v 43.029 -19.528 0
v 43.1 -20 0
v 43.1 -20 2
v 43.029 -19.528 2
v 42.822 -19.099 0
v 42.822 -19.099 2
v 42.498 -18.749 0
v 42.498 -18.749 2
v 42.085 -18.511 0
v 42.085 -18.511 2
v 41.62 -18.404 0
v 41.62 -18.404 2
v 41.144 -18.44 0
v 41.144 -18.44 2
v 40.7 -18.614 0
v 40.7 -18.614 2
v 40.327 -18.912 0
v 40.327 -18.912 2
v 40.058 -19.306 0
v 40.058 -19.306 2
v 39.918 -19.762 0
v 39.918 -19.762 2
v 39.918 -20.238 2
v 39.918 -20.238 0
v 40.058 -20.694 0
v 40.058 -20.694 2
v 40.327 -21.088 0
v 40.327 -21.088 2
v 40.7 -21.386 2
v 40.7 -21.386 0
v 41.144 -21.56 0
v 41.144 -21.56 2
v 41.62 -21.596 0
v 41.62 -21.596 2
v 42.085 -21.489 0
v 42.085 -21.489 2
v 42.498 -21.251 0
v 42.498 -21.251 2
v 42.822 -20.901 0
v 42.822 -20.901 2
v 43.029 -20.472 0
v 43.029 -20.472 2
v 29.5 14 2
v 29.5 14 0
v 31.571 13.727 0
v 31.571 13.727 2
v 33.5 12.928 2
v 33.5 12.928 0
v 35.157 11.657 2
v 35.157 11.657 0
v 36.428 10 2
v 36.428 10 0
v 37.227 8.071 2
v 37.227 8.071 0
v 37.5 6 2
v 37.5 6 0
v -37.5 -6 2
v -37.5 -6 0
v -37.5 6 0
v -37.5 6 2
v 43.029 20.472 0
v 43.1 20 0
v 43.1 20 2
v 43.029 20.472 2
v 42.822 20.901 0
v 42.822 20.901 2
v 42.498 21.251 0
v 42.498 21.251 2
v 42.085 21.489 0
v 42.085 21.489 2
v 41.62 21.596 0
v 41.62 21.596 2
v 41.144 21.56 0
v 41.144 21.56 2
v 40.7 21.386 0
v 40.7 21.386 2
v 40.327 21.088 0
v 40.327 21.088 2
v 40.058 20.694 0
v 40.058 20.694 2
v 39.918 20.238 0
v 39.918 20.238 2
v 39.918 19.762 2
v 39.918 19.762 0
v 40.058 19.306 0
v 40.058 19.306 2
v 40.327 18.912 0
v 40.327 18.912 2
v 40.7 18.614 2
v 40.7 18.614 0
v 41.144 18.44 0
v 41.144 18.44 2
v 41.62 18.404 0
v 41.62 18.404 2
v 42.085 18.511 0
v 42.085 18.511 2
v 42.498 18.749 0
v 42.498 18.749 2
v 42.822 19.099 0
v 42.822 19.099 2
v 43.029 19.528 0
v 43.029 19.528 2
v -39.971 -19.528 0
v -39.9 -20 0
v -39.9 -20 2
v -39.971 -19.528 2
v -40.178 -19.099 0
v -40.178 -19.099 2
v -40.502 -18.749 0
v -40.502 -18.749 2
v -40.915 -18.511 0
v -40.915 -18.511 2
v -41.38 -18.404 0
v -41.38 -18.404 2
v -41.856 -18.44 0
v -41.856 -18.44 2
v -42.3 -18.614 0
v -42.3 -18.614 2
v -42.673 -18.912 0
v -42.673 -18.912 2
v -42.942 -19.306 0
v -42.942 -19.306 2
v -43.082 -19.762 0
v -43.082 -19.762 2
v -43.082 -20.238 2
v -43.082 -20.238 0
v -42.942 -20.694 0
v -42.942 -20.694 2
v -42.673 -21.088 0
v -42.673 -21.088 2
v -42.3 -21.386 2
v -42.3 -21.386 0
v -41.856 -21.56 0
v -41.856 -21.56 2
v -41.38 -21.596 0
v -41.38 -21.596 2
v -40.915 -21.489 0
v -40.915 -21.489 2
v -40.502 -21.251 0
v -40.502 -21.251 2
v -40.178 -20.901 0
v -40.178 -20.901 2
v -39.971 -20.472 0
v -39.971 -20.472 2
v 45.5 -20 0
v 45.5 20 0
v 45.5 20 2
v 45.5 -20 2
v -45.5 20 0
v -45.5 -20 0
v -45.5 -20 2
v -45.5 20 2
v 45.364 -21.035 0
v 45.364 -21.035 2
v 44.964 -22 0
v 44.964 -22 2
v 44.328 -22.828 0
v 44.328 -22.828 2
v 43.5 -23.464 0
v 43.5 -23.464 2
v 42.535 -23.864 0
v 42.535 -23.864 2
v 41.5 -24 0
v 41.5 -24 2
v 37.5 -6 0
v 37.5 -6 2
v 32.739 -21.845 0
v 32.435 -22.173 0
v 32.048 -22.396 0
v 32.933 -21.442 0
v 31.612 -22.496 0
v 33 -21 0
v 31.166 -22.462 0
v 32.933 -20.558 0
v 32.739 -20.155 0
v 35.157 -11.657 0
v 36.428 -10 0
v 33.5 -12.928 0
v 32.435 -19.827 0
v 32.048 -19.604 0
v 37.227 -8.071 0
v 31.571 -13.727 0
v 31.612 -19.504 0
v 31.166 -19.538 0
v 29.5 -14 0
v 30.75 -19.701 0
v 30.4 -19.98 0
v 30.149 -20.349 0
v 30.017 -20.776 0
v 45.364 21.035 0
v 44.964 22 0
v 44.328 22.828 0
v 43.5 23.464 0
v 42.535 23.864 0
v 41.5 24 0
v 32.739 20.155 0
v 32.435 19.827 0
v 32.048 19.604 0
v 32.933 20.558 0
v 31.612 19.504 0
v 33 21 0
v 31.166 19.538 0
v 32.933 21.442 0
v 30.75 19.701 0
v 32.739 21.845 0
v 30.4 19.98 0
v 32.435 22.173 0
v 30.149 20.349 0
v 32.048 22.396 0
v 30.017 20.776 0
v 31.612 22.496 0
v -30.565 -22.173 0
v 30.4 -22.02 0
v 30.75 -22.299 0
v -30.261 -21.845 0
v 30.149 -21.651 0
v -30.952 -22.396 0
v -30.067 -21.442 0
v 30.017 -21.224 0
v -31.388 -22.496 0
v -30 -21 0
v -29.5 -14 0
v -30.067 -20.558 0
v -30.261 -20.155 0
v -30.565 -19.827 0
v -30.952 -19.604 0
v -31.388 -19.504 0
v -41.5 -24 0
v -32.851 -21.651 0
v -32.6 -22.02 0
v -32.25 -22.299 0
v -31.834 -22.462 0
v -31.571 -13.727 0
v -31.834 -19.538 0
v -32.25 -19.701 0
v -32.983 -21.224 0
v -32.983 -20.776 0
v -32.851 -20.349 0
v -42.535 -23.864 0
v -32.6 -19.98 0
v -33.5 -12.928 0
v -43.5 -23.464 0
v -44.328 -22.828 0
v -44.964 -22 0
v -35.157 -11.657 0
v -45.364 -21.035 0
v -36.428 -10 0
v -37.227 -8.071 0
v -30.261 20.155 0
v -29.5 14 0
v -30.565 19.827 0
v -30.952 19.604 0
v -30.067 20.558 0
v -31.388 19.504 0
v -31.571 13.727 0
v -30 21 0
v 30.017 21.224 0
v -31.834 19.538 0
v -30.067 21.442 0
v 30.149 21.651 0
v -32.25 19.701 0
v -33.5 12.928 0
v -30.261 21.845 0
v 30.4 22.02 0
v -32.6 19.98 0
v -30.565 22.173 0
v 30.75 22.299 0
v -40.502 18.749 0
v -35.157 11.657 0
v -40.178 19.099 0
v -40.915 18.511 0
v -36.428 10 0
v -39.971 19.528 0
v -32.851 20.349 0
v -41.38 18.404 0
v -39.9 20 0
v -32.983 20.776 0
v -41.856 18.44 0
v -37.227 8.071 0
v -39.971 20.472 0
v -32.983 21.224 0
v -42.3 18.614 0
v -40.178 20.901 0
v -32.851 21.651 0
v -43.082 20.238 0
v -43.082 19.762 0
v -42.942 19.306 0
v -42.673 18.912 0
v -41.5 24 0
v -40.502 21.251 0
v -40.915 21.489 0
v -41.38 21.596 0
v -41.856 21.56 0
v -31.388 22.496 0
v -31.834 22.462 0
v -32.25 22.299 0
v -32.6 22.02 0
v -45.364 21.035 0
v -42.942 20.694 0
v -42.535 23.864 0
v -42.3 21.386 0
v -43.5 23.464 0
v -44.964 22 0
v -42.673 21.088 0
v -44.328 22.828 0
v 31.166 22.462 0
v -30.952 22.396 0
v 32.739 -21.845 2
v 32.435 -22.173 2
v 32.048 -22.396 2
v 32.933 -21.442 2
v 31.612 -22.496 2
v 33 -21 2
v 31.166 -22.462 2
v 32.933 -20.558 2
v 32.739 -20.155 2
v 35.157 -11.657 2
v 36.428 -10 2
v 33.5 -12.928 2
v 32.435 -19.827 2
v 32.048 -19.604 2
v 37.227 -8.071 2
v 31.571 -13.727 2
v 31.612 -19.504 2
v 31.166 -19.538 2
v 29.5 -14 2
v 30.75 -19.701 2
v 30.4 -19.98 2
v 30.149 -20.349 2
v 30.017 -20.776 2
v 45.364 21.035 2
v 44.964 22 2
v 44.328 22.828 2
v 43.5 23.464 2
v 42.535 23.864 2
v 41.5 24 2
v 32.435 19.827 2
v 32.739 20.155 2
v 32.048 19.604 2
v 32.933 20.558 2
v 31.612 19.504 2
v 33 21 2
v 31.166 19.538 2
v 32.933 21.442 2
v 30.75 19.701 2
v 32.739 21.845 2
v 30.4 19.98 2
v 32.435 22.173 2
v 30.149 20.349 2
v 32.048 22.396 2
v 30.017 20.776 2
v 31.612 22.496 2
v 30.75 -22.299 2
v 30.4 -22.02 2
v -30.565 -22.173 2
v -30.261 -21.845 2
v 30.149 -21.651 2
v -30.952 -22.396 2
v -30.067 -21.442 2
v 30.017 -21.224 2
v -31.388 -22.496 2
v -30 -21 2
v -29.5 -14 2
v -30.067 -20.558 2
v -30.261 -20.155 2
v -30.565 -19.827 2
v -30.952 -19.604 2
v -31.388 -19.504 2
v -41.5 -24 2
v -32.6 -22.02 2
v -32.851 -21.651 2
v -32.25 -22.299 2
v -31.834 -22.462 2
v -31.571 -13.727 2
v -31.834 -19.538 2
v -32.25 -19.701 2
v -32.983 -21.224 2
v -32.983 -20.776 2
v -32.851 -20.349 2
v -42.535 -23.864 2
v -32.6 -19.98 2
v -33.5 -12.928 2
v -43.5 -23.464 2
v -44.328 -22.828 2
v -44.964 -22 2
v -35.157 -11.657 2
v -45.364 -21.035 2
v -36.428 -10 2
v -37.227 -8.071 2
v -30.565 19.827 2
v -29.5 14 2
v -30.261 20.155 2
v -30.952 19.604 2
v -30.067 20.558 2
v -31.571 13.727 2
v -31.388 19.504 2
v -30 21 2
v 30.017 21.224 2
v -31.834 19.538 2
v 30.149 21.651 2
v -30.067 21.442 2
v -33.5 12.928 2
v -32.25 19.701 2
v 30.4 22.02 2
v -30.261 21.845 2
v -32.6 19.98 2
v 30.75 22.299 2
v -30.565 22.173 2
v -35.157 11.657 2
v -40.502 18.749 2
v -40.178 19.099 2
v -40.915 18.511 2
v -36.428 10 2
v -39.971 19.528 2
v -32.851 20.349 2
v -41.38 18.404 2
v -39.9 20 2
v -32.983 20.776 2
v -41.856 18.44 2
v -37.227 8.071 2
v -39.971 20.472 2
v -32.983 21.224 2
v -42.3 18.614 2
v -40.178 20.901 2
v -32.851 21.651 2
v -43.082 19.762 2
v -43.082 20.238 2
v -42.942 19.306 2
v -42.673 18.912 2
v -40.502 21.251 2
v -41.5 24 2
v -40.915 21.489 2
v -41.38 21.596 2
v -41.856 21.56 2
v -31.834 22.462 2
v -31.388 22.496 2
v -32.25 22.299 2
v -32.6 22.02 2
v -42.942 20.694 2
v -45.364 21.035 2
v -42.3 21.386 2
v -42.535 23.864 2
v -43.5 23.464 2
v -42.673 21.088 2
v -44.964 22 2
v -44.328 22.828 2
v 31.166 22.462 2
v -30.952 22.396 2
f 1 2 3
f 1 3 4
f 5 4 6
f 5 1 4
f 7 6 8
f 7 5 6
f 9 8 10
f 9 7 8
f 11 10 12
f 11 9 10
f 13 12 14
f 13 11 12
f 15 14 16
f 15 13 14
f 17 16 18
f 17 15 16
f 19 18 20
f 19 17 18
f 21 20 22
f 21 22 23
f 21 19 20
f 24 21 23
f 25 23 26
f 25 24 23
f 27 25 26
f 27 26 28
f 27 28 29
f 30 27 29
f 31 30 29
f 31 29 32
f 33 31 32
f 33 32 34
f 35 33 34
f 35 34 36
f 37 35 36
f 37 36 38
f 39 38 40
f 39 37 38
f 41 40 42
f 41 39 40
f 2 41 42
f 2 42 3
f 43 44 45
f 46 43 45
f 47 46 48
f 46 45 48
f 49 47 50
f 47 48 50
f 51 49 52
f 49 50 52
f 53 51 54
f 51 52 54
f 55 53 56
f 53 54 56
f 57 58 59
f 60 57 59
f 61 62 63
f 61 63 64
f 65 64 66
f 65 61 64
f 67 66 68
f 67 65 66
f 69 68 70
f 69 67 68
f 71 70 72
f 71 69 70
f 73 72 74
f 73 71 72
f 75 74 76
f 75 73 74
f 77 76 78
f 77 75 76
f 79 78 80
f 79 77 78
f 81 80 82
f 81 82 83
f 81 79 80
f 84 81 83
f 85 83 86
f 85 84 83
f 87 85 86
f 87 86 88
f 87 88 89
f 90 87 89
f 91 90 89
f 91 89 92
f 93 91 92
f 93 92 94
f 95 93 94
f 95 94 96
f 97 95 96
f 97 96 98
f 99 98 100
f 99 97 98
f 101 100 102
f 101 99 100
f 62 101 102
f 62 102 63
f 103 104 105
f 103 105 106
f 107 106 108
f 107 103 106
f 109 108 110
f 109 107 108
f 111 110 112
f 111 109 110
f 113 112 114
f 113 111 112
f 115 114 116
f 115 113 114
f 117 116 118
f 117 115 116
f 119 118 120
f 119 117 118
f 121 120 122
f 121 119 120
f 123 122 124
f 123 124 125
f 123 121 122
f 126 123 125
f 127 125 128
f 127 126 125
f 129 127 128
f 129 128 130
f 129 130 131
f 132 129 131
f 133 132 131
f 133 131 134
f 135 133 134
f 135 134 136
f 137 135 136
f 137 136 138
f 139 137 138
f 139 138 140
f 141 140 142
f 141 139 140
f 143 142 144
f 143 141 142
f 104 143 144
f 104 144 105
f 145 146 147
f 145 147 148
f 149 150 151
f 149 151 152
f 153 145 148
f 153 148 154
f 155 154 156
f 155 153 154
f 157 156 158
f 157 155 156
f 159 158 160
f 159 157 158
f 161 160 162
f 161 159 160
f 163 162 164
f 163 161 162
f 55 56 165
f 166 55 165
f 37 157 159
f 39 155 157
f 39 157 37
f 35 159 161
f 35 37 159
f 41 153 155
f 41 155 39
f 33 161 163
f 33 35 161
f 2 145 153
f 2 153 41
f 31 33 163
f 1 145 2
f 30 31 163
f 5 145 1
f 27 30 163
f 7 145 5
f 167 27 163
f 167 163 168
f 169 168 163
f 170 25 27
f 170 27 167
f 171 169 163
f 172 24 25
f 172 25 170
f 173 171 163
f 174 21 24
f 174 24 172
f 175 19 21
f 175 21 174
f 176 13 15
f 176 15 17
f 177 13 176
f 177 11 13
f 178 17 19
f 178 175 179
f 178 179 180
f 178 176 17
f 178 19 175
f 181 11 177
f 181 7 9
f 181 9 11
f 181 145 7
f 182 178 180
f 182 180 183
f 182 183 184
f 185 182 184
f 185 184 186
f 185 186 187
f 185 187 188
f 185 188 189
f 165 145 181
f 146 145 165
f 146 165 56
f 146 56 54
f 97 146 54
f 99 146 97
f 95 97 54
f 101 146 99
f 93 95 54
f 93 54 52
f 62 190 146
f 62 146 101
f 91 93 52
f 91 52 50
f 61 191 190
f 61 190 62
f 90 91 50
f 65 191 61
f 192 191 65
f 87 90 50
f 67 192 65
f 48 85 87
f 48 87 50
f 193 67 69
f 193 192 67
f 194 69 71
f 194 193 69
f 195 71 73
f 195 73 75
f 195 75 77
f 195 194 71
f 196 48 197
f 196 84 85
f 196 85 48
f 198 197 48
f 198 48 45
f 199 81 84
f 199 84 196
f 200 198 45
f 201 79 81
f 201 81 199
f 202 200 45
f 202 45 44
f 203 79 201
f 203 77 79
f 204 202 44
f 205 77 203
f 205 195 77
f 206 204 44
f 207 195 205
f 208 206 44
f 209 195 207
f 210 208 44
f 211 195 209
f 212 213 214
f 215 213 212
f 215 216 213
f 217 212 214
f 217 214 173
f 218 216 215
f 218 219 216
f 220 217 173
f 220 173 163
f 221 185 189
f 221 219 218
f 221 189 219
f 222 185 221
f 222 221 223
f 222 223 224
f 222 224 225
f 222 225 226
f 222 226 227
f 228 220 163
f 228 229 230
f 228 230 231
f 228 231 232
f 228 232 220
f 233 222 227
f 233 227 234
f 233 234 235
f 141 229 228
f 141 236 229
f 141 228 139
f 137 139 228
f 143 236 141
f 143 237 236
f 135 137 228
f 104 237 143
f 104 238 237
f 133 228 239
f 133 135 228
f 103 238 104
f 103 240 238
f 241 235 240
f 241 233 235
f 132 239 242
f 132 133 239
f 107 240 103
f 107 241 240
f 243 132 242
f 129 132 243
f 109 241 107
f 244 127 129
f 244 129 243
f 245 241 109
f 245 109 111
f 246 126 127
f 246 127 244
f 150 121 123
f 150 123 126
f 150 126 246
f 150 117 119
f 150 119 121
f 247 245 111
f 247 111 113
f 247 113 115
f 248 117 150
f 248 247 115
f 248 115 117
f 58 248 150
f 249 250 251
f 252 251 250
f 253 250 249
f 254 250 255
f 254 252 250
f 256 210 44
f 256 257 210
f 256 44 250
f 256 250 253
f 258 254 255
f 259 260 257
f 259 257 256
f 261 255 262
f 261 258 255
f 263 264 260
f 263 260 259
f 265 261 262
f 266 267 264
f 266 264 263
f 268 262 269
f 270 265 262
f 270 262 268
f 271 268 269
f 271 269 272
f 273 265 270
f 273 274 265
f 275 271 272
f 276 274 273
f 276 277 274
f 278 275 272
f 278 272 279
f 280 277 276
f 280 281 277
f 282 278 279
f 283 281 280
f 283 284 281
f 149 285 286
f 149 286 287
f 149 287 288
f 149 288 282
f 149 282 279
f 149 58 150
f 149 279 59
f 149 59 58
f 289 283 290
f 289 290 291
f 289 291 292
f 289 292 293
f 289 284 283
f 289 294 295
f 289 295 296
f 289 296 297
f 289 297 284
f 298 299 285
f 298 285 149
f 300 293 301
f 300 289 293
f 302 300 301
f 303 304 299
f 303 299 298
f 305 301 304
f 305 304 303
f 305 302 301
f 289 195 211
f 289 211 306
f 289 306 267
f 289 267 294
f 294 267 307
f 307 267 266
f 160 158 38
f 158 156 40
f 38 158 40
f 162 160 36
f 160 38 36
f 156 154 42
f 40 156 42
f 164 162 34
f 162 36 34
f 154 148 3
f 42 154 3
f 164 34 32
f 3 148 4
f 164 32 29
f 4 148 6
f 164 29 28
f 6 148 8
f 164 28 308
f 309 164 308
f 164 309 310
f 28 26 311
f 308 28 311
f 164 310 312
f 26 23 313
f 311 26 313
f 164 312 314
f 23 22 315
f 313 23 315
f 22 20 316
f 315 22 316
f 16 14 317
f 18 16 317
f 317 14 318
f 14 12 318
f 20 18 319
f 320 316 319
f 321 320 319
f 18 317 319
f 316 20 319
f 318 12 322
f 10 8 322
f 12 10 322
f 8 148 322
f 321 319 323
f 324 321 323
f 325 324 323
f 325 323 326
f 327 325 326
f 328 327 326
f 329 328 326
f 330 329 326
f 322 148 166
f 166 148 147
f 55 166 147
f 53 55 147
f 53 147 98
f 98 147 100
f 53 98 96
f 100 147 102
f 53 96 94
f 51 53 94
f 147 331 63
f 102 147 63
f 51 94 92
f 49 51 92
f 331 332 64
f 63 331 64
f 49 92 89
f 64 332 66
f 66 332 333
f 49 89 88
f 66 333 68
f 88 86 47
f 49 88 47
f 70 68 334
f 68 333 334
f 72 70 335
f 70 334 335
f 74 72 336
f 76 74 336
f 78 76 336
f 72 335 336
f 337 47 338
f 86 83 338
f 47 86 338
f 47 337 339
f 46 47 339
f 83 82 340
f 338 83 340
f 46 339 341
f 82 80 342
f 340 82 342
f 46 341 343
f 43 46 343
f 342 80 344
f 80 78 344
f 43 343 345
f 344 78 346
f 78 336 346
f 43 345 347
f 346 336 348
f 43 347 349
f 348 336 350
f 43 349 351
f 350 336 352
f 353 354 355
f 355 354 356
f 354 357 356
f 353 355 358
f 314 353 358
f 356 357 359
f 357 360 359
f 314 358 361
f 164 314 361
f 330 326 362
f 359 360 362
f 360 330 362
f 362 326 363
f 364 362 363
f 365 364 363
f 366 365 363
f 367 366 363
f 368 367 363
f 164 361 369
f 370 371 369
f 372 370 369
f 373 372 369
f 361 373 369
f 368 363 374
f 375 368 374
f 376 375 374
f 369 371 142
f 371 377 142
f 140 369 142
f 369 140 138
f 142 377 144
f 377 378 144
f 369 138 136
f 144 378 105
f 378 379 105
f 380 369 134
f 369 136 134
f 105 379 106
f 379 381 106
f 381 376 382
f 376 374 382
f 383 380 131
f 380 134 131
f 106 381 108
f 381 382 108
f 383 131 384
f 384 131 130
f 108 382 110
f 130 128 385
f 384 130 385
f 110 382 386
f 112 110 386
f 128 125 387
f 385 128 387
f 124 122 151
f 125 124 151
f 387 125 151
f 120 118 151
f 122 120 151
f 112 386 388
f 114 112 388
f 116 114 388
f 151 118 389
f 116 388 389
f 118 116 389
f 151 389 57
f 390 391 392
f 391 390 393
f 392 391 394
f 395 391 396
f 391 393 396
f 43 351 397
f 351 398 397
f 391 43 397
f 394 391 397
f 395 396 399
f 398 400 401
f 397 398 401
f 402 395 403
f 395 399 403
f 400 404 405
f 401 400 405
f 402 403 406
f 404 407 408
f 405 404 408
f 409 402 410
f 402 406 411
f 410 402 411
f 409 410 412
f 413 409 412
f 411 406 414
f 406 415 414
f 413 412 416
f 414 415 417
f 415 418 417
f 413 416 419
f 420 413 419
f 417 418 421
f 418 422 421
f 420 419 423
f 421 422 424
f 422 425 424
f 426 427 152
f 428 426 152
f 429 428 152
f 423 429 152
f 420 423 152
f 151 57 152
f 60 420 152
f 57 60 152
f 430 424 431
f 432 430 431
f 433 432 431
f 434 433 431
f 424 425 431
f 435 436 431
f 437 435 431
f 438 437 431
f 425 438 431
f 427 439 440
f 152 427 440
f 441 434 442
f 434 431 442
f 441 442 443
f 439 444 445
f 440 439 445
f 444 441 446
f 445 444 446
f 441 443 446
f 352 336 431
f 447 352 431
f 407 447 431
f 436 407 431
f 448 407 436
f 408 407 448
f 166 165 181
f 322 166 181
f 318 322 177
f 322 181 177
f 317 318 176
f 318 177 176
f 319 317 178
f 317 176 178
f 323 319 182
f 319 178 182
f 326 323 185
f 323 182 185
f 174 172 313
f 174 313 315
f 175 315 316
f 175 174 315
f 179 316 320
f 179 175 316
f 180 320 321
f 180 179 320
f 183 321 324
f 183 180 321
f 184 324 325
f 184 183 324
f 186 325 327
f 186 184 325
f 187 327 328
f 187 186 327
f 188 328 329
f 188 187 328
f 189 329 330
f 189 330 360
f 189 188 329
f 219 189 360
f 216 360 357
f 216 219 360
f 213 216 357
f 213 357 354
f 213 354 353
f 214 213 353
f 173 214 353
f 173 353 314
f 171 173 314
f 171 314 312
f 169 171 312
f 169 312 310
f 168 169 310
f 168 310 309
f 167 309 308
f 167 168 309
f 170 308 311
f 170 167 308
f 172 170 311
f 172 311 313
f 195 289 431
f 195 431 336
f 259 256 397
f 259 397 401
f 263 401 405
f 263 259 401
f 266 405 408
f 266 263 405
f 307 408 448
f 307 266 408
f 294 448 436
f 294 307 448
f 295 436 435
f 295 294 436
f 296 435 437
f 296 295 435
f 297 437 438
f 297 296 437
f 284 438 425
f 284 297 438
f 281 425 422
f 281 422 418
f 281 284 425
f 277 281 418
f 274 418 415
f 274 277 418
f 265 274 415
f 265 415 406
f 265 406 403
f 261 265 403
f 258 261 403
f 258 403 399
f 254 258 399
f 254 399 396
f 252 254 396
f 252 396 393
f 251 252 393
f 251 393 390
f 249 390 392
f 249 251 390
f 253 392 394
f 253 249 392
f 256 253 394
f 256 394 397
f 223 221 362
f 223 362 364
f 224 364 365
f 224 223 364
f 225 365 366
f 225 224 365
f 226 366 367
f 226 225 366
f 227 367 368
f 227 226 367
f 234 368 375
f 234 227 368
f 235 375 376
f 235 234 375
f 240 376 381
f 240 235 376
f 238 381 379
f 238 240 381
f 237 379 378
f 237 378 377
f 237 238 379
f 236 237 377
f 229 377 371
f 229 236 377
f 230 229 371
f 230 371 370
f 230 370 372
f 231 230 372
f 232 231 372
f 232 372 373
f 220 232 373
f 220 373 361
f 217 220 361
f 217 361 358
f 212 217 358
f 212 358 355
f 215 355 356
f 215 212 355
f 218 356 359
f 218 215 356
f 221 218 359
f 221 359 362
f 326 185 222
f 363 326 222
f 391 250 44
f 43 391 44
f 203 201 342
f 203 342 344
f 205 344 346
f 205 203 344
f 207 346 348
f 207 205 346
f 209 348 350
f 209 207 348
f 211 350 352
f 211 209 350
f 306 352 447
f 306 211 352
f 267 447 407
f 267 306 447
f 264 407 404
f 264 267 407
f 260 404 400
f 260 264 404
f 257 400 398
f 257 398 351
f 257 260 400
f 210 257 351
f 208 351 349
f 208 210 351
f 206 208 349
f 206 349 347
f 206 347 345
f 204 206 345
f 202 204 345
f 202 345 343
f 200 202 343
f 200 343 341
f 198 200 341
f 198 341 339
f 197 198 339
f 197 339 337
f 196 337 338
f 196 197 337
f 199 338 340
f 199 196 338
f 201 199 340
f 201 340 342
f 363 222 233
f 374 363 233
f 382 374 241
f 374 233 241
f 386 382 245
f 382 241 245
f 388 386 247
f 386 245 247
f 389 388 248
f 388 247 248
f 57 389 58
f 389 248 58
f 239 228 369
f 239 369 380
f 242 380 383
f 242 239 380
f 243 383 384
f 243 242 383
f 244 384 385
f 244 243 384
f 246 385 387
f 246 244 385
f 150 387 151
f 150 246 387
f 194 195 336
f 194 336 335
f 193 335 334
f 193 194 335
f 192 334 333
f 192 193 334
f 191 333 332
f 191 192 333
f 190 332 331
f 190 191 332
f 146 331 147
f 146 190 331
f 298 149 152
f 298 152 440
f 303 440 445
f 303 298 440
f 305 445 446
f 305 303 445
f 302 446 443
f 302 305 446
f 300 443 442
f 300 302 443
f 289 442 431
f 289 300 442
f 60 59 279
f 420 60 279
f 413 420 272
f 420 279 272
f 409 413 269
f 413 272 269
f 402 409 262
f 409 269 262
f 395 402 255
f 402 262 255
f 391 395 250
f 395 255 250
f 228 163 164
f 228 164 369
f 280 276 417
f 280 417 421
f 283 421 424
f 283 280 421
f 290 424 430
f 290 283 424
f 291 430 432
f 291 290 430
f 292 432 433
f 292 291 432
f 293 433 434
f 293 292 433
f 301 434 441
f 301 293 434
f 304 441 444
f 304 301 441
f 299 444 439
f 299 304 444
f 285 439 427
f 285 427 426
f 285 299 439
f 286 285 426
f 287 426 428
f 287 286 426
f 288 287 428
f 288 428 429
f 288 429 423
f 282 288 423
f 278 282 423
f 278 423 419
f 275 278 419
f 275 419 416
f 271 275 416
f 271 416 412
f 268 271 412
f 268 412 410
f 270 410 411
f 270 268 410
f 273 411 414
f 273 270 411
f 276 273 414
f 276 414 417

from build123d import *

# Parameters (mm, degrees)
SKETCH_1_R      = 1.5
SKETCH_1_R_2    = 1.6
EXTRUDE_1_DEPTH = 2


with BuildPart() as part:
    # 草图1 → 凸台-拉伸1 (new body)
    with BuildSketch(Plane.XY):
        with BuildLine():
            Line((41.5, -24), (-41.5, -24))
            ThreePointArc((-41.5, -24), (-44.328427125, -22.828427125), (-45.5, -20))
            Line((-45.5, -20), (-45.5, 20))
            ThreePointArc((-45.5, 20), (-44.328427125, 22.828427125), (-41.5, 24))
            Line((-41.5, 24), (41.5, 24))
            ThreePointArc((41.5, 24), (44.328427125, 22.828427125), (45.5, 20))
            Line((45.5, 20), (45.5, -20))
            ThreePointArc((45.5, -20), (44.328427125, -22.828427125), (41.5, -24))
        make_face()
        with Locations((-31.5, 21)):
            Circle(SKETCH_1_R, mode=Mode.SUBTRACT)
        with Locations((31.5, 21)):
            Circle(SKETCH_1_R, mode=Mode.SUBTRACT)
        with Locations((31.5, -21)):
            Circle(SKETCH_1_R, mode=Mode.SUBTRACT)
        with Locations((-31.5, -21)):
            Circle(SKETCH_1_R, mode=Mode.SUBTRACT)
        with Locations((-41.5, 20)):
            Circle(SKETCH_1_R_2, mode=Mode.SUBTRACT)
        with Locations((-41.5, -20)):
            Circle(SKETCH_1_R_2, mode=Mode.SUBTRACT)
        with Locations((41.5, 20)):
            Circle(SKETCH_1_R_2, mode=Mode.SUBTRACT)
        with Locations((41.5, -20)):
            Circle(SKETCH_1_R_2, mode=Mode.SUBTRACT)
        with BuildLine():
            Line((29.5, -14), (-29.5, -14))
            ThreePointArc((-29.5, -14), (-35.156854249, -11.656854249), (-37.5, -6))
            Line((-37.5, -6), (-37.5, 6))
            ThreePointArc((-37.5, 6), (-35.156854249, 11.656854249), (-29.5, 14))
            Line((-29.5, 14), (29.5, 14))
            ThreePointArc((29.5, 14), (35.156854249, 11.656854249), (37.5, 6))
            Line((37.5, 6), (37.5, -6))
            ThreePointArc((37.5, -6), (35.156854249, -11.656854249), (29.5, -14))
        make_face(mode=Mode.SUBTRACT)
    extrude(amount=EXTRUDE_1_DEPTH)


solid = part.part
